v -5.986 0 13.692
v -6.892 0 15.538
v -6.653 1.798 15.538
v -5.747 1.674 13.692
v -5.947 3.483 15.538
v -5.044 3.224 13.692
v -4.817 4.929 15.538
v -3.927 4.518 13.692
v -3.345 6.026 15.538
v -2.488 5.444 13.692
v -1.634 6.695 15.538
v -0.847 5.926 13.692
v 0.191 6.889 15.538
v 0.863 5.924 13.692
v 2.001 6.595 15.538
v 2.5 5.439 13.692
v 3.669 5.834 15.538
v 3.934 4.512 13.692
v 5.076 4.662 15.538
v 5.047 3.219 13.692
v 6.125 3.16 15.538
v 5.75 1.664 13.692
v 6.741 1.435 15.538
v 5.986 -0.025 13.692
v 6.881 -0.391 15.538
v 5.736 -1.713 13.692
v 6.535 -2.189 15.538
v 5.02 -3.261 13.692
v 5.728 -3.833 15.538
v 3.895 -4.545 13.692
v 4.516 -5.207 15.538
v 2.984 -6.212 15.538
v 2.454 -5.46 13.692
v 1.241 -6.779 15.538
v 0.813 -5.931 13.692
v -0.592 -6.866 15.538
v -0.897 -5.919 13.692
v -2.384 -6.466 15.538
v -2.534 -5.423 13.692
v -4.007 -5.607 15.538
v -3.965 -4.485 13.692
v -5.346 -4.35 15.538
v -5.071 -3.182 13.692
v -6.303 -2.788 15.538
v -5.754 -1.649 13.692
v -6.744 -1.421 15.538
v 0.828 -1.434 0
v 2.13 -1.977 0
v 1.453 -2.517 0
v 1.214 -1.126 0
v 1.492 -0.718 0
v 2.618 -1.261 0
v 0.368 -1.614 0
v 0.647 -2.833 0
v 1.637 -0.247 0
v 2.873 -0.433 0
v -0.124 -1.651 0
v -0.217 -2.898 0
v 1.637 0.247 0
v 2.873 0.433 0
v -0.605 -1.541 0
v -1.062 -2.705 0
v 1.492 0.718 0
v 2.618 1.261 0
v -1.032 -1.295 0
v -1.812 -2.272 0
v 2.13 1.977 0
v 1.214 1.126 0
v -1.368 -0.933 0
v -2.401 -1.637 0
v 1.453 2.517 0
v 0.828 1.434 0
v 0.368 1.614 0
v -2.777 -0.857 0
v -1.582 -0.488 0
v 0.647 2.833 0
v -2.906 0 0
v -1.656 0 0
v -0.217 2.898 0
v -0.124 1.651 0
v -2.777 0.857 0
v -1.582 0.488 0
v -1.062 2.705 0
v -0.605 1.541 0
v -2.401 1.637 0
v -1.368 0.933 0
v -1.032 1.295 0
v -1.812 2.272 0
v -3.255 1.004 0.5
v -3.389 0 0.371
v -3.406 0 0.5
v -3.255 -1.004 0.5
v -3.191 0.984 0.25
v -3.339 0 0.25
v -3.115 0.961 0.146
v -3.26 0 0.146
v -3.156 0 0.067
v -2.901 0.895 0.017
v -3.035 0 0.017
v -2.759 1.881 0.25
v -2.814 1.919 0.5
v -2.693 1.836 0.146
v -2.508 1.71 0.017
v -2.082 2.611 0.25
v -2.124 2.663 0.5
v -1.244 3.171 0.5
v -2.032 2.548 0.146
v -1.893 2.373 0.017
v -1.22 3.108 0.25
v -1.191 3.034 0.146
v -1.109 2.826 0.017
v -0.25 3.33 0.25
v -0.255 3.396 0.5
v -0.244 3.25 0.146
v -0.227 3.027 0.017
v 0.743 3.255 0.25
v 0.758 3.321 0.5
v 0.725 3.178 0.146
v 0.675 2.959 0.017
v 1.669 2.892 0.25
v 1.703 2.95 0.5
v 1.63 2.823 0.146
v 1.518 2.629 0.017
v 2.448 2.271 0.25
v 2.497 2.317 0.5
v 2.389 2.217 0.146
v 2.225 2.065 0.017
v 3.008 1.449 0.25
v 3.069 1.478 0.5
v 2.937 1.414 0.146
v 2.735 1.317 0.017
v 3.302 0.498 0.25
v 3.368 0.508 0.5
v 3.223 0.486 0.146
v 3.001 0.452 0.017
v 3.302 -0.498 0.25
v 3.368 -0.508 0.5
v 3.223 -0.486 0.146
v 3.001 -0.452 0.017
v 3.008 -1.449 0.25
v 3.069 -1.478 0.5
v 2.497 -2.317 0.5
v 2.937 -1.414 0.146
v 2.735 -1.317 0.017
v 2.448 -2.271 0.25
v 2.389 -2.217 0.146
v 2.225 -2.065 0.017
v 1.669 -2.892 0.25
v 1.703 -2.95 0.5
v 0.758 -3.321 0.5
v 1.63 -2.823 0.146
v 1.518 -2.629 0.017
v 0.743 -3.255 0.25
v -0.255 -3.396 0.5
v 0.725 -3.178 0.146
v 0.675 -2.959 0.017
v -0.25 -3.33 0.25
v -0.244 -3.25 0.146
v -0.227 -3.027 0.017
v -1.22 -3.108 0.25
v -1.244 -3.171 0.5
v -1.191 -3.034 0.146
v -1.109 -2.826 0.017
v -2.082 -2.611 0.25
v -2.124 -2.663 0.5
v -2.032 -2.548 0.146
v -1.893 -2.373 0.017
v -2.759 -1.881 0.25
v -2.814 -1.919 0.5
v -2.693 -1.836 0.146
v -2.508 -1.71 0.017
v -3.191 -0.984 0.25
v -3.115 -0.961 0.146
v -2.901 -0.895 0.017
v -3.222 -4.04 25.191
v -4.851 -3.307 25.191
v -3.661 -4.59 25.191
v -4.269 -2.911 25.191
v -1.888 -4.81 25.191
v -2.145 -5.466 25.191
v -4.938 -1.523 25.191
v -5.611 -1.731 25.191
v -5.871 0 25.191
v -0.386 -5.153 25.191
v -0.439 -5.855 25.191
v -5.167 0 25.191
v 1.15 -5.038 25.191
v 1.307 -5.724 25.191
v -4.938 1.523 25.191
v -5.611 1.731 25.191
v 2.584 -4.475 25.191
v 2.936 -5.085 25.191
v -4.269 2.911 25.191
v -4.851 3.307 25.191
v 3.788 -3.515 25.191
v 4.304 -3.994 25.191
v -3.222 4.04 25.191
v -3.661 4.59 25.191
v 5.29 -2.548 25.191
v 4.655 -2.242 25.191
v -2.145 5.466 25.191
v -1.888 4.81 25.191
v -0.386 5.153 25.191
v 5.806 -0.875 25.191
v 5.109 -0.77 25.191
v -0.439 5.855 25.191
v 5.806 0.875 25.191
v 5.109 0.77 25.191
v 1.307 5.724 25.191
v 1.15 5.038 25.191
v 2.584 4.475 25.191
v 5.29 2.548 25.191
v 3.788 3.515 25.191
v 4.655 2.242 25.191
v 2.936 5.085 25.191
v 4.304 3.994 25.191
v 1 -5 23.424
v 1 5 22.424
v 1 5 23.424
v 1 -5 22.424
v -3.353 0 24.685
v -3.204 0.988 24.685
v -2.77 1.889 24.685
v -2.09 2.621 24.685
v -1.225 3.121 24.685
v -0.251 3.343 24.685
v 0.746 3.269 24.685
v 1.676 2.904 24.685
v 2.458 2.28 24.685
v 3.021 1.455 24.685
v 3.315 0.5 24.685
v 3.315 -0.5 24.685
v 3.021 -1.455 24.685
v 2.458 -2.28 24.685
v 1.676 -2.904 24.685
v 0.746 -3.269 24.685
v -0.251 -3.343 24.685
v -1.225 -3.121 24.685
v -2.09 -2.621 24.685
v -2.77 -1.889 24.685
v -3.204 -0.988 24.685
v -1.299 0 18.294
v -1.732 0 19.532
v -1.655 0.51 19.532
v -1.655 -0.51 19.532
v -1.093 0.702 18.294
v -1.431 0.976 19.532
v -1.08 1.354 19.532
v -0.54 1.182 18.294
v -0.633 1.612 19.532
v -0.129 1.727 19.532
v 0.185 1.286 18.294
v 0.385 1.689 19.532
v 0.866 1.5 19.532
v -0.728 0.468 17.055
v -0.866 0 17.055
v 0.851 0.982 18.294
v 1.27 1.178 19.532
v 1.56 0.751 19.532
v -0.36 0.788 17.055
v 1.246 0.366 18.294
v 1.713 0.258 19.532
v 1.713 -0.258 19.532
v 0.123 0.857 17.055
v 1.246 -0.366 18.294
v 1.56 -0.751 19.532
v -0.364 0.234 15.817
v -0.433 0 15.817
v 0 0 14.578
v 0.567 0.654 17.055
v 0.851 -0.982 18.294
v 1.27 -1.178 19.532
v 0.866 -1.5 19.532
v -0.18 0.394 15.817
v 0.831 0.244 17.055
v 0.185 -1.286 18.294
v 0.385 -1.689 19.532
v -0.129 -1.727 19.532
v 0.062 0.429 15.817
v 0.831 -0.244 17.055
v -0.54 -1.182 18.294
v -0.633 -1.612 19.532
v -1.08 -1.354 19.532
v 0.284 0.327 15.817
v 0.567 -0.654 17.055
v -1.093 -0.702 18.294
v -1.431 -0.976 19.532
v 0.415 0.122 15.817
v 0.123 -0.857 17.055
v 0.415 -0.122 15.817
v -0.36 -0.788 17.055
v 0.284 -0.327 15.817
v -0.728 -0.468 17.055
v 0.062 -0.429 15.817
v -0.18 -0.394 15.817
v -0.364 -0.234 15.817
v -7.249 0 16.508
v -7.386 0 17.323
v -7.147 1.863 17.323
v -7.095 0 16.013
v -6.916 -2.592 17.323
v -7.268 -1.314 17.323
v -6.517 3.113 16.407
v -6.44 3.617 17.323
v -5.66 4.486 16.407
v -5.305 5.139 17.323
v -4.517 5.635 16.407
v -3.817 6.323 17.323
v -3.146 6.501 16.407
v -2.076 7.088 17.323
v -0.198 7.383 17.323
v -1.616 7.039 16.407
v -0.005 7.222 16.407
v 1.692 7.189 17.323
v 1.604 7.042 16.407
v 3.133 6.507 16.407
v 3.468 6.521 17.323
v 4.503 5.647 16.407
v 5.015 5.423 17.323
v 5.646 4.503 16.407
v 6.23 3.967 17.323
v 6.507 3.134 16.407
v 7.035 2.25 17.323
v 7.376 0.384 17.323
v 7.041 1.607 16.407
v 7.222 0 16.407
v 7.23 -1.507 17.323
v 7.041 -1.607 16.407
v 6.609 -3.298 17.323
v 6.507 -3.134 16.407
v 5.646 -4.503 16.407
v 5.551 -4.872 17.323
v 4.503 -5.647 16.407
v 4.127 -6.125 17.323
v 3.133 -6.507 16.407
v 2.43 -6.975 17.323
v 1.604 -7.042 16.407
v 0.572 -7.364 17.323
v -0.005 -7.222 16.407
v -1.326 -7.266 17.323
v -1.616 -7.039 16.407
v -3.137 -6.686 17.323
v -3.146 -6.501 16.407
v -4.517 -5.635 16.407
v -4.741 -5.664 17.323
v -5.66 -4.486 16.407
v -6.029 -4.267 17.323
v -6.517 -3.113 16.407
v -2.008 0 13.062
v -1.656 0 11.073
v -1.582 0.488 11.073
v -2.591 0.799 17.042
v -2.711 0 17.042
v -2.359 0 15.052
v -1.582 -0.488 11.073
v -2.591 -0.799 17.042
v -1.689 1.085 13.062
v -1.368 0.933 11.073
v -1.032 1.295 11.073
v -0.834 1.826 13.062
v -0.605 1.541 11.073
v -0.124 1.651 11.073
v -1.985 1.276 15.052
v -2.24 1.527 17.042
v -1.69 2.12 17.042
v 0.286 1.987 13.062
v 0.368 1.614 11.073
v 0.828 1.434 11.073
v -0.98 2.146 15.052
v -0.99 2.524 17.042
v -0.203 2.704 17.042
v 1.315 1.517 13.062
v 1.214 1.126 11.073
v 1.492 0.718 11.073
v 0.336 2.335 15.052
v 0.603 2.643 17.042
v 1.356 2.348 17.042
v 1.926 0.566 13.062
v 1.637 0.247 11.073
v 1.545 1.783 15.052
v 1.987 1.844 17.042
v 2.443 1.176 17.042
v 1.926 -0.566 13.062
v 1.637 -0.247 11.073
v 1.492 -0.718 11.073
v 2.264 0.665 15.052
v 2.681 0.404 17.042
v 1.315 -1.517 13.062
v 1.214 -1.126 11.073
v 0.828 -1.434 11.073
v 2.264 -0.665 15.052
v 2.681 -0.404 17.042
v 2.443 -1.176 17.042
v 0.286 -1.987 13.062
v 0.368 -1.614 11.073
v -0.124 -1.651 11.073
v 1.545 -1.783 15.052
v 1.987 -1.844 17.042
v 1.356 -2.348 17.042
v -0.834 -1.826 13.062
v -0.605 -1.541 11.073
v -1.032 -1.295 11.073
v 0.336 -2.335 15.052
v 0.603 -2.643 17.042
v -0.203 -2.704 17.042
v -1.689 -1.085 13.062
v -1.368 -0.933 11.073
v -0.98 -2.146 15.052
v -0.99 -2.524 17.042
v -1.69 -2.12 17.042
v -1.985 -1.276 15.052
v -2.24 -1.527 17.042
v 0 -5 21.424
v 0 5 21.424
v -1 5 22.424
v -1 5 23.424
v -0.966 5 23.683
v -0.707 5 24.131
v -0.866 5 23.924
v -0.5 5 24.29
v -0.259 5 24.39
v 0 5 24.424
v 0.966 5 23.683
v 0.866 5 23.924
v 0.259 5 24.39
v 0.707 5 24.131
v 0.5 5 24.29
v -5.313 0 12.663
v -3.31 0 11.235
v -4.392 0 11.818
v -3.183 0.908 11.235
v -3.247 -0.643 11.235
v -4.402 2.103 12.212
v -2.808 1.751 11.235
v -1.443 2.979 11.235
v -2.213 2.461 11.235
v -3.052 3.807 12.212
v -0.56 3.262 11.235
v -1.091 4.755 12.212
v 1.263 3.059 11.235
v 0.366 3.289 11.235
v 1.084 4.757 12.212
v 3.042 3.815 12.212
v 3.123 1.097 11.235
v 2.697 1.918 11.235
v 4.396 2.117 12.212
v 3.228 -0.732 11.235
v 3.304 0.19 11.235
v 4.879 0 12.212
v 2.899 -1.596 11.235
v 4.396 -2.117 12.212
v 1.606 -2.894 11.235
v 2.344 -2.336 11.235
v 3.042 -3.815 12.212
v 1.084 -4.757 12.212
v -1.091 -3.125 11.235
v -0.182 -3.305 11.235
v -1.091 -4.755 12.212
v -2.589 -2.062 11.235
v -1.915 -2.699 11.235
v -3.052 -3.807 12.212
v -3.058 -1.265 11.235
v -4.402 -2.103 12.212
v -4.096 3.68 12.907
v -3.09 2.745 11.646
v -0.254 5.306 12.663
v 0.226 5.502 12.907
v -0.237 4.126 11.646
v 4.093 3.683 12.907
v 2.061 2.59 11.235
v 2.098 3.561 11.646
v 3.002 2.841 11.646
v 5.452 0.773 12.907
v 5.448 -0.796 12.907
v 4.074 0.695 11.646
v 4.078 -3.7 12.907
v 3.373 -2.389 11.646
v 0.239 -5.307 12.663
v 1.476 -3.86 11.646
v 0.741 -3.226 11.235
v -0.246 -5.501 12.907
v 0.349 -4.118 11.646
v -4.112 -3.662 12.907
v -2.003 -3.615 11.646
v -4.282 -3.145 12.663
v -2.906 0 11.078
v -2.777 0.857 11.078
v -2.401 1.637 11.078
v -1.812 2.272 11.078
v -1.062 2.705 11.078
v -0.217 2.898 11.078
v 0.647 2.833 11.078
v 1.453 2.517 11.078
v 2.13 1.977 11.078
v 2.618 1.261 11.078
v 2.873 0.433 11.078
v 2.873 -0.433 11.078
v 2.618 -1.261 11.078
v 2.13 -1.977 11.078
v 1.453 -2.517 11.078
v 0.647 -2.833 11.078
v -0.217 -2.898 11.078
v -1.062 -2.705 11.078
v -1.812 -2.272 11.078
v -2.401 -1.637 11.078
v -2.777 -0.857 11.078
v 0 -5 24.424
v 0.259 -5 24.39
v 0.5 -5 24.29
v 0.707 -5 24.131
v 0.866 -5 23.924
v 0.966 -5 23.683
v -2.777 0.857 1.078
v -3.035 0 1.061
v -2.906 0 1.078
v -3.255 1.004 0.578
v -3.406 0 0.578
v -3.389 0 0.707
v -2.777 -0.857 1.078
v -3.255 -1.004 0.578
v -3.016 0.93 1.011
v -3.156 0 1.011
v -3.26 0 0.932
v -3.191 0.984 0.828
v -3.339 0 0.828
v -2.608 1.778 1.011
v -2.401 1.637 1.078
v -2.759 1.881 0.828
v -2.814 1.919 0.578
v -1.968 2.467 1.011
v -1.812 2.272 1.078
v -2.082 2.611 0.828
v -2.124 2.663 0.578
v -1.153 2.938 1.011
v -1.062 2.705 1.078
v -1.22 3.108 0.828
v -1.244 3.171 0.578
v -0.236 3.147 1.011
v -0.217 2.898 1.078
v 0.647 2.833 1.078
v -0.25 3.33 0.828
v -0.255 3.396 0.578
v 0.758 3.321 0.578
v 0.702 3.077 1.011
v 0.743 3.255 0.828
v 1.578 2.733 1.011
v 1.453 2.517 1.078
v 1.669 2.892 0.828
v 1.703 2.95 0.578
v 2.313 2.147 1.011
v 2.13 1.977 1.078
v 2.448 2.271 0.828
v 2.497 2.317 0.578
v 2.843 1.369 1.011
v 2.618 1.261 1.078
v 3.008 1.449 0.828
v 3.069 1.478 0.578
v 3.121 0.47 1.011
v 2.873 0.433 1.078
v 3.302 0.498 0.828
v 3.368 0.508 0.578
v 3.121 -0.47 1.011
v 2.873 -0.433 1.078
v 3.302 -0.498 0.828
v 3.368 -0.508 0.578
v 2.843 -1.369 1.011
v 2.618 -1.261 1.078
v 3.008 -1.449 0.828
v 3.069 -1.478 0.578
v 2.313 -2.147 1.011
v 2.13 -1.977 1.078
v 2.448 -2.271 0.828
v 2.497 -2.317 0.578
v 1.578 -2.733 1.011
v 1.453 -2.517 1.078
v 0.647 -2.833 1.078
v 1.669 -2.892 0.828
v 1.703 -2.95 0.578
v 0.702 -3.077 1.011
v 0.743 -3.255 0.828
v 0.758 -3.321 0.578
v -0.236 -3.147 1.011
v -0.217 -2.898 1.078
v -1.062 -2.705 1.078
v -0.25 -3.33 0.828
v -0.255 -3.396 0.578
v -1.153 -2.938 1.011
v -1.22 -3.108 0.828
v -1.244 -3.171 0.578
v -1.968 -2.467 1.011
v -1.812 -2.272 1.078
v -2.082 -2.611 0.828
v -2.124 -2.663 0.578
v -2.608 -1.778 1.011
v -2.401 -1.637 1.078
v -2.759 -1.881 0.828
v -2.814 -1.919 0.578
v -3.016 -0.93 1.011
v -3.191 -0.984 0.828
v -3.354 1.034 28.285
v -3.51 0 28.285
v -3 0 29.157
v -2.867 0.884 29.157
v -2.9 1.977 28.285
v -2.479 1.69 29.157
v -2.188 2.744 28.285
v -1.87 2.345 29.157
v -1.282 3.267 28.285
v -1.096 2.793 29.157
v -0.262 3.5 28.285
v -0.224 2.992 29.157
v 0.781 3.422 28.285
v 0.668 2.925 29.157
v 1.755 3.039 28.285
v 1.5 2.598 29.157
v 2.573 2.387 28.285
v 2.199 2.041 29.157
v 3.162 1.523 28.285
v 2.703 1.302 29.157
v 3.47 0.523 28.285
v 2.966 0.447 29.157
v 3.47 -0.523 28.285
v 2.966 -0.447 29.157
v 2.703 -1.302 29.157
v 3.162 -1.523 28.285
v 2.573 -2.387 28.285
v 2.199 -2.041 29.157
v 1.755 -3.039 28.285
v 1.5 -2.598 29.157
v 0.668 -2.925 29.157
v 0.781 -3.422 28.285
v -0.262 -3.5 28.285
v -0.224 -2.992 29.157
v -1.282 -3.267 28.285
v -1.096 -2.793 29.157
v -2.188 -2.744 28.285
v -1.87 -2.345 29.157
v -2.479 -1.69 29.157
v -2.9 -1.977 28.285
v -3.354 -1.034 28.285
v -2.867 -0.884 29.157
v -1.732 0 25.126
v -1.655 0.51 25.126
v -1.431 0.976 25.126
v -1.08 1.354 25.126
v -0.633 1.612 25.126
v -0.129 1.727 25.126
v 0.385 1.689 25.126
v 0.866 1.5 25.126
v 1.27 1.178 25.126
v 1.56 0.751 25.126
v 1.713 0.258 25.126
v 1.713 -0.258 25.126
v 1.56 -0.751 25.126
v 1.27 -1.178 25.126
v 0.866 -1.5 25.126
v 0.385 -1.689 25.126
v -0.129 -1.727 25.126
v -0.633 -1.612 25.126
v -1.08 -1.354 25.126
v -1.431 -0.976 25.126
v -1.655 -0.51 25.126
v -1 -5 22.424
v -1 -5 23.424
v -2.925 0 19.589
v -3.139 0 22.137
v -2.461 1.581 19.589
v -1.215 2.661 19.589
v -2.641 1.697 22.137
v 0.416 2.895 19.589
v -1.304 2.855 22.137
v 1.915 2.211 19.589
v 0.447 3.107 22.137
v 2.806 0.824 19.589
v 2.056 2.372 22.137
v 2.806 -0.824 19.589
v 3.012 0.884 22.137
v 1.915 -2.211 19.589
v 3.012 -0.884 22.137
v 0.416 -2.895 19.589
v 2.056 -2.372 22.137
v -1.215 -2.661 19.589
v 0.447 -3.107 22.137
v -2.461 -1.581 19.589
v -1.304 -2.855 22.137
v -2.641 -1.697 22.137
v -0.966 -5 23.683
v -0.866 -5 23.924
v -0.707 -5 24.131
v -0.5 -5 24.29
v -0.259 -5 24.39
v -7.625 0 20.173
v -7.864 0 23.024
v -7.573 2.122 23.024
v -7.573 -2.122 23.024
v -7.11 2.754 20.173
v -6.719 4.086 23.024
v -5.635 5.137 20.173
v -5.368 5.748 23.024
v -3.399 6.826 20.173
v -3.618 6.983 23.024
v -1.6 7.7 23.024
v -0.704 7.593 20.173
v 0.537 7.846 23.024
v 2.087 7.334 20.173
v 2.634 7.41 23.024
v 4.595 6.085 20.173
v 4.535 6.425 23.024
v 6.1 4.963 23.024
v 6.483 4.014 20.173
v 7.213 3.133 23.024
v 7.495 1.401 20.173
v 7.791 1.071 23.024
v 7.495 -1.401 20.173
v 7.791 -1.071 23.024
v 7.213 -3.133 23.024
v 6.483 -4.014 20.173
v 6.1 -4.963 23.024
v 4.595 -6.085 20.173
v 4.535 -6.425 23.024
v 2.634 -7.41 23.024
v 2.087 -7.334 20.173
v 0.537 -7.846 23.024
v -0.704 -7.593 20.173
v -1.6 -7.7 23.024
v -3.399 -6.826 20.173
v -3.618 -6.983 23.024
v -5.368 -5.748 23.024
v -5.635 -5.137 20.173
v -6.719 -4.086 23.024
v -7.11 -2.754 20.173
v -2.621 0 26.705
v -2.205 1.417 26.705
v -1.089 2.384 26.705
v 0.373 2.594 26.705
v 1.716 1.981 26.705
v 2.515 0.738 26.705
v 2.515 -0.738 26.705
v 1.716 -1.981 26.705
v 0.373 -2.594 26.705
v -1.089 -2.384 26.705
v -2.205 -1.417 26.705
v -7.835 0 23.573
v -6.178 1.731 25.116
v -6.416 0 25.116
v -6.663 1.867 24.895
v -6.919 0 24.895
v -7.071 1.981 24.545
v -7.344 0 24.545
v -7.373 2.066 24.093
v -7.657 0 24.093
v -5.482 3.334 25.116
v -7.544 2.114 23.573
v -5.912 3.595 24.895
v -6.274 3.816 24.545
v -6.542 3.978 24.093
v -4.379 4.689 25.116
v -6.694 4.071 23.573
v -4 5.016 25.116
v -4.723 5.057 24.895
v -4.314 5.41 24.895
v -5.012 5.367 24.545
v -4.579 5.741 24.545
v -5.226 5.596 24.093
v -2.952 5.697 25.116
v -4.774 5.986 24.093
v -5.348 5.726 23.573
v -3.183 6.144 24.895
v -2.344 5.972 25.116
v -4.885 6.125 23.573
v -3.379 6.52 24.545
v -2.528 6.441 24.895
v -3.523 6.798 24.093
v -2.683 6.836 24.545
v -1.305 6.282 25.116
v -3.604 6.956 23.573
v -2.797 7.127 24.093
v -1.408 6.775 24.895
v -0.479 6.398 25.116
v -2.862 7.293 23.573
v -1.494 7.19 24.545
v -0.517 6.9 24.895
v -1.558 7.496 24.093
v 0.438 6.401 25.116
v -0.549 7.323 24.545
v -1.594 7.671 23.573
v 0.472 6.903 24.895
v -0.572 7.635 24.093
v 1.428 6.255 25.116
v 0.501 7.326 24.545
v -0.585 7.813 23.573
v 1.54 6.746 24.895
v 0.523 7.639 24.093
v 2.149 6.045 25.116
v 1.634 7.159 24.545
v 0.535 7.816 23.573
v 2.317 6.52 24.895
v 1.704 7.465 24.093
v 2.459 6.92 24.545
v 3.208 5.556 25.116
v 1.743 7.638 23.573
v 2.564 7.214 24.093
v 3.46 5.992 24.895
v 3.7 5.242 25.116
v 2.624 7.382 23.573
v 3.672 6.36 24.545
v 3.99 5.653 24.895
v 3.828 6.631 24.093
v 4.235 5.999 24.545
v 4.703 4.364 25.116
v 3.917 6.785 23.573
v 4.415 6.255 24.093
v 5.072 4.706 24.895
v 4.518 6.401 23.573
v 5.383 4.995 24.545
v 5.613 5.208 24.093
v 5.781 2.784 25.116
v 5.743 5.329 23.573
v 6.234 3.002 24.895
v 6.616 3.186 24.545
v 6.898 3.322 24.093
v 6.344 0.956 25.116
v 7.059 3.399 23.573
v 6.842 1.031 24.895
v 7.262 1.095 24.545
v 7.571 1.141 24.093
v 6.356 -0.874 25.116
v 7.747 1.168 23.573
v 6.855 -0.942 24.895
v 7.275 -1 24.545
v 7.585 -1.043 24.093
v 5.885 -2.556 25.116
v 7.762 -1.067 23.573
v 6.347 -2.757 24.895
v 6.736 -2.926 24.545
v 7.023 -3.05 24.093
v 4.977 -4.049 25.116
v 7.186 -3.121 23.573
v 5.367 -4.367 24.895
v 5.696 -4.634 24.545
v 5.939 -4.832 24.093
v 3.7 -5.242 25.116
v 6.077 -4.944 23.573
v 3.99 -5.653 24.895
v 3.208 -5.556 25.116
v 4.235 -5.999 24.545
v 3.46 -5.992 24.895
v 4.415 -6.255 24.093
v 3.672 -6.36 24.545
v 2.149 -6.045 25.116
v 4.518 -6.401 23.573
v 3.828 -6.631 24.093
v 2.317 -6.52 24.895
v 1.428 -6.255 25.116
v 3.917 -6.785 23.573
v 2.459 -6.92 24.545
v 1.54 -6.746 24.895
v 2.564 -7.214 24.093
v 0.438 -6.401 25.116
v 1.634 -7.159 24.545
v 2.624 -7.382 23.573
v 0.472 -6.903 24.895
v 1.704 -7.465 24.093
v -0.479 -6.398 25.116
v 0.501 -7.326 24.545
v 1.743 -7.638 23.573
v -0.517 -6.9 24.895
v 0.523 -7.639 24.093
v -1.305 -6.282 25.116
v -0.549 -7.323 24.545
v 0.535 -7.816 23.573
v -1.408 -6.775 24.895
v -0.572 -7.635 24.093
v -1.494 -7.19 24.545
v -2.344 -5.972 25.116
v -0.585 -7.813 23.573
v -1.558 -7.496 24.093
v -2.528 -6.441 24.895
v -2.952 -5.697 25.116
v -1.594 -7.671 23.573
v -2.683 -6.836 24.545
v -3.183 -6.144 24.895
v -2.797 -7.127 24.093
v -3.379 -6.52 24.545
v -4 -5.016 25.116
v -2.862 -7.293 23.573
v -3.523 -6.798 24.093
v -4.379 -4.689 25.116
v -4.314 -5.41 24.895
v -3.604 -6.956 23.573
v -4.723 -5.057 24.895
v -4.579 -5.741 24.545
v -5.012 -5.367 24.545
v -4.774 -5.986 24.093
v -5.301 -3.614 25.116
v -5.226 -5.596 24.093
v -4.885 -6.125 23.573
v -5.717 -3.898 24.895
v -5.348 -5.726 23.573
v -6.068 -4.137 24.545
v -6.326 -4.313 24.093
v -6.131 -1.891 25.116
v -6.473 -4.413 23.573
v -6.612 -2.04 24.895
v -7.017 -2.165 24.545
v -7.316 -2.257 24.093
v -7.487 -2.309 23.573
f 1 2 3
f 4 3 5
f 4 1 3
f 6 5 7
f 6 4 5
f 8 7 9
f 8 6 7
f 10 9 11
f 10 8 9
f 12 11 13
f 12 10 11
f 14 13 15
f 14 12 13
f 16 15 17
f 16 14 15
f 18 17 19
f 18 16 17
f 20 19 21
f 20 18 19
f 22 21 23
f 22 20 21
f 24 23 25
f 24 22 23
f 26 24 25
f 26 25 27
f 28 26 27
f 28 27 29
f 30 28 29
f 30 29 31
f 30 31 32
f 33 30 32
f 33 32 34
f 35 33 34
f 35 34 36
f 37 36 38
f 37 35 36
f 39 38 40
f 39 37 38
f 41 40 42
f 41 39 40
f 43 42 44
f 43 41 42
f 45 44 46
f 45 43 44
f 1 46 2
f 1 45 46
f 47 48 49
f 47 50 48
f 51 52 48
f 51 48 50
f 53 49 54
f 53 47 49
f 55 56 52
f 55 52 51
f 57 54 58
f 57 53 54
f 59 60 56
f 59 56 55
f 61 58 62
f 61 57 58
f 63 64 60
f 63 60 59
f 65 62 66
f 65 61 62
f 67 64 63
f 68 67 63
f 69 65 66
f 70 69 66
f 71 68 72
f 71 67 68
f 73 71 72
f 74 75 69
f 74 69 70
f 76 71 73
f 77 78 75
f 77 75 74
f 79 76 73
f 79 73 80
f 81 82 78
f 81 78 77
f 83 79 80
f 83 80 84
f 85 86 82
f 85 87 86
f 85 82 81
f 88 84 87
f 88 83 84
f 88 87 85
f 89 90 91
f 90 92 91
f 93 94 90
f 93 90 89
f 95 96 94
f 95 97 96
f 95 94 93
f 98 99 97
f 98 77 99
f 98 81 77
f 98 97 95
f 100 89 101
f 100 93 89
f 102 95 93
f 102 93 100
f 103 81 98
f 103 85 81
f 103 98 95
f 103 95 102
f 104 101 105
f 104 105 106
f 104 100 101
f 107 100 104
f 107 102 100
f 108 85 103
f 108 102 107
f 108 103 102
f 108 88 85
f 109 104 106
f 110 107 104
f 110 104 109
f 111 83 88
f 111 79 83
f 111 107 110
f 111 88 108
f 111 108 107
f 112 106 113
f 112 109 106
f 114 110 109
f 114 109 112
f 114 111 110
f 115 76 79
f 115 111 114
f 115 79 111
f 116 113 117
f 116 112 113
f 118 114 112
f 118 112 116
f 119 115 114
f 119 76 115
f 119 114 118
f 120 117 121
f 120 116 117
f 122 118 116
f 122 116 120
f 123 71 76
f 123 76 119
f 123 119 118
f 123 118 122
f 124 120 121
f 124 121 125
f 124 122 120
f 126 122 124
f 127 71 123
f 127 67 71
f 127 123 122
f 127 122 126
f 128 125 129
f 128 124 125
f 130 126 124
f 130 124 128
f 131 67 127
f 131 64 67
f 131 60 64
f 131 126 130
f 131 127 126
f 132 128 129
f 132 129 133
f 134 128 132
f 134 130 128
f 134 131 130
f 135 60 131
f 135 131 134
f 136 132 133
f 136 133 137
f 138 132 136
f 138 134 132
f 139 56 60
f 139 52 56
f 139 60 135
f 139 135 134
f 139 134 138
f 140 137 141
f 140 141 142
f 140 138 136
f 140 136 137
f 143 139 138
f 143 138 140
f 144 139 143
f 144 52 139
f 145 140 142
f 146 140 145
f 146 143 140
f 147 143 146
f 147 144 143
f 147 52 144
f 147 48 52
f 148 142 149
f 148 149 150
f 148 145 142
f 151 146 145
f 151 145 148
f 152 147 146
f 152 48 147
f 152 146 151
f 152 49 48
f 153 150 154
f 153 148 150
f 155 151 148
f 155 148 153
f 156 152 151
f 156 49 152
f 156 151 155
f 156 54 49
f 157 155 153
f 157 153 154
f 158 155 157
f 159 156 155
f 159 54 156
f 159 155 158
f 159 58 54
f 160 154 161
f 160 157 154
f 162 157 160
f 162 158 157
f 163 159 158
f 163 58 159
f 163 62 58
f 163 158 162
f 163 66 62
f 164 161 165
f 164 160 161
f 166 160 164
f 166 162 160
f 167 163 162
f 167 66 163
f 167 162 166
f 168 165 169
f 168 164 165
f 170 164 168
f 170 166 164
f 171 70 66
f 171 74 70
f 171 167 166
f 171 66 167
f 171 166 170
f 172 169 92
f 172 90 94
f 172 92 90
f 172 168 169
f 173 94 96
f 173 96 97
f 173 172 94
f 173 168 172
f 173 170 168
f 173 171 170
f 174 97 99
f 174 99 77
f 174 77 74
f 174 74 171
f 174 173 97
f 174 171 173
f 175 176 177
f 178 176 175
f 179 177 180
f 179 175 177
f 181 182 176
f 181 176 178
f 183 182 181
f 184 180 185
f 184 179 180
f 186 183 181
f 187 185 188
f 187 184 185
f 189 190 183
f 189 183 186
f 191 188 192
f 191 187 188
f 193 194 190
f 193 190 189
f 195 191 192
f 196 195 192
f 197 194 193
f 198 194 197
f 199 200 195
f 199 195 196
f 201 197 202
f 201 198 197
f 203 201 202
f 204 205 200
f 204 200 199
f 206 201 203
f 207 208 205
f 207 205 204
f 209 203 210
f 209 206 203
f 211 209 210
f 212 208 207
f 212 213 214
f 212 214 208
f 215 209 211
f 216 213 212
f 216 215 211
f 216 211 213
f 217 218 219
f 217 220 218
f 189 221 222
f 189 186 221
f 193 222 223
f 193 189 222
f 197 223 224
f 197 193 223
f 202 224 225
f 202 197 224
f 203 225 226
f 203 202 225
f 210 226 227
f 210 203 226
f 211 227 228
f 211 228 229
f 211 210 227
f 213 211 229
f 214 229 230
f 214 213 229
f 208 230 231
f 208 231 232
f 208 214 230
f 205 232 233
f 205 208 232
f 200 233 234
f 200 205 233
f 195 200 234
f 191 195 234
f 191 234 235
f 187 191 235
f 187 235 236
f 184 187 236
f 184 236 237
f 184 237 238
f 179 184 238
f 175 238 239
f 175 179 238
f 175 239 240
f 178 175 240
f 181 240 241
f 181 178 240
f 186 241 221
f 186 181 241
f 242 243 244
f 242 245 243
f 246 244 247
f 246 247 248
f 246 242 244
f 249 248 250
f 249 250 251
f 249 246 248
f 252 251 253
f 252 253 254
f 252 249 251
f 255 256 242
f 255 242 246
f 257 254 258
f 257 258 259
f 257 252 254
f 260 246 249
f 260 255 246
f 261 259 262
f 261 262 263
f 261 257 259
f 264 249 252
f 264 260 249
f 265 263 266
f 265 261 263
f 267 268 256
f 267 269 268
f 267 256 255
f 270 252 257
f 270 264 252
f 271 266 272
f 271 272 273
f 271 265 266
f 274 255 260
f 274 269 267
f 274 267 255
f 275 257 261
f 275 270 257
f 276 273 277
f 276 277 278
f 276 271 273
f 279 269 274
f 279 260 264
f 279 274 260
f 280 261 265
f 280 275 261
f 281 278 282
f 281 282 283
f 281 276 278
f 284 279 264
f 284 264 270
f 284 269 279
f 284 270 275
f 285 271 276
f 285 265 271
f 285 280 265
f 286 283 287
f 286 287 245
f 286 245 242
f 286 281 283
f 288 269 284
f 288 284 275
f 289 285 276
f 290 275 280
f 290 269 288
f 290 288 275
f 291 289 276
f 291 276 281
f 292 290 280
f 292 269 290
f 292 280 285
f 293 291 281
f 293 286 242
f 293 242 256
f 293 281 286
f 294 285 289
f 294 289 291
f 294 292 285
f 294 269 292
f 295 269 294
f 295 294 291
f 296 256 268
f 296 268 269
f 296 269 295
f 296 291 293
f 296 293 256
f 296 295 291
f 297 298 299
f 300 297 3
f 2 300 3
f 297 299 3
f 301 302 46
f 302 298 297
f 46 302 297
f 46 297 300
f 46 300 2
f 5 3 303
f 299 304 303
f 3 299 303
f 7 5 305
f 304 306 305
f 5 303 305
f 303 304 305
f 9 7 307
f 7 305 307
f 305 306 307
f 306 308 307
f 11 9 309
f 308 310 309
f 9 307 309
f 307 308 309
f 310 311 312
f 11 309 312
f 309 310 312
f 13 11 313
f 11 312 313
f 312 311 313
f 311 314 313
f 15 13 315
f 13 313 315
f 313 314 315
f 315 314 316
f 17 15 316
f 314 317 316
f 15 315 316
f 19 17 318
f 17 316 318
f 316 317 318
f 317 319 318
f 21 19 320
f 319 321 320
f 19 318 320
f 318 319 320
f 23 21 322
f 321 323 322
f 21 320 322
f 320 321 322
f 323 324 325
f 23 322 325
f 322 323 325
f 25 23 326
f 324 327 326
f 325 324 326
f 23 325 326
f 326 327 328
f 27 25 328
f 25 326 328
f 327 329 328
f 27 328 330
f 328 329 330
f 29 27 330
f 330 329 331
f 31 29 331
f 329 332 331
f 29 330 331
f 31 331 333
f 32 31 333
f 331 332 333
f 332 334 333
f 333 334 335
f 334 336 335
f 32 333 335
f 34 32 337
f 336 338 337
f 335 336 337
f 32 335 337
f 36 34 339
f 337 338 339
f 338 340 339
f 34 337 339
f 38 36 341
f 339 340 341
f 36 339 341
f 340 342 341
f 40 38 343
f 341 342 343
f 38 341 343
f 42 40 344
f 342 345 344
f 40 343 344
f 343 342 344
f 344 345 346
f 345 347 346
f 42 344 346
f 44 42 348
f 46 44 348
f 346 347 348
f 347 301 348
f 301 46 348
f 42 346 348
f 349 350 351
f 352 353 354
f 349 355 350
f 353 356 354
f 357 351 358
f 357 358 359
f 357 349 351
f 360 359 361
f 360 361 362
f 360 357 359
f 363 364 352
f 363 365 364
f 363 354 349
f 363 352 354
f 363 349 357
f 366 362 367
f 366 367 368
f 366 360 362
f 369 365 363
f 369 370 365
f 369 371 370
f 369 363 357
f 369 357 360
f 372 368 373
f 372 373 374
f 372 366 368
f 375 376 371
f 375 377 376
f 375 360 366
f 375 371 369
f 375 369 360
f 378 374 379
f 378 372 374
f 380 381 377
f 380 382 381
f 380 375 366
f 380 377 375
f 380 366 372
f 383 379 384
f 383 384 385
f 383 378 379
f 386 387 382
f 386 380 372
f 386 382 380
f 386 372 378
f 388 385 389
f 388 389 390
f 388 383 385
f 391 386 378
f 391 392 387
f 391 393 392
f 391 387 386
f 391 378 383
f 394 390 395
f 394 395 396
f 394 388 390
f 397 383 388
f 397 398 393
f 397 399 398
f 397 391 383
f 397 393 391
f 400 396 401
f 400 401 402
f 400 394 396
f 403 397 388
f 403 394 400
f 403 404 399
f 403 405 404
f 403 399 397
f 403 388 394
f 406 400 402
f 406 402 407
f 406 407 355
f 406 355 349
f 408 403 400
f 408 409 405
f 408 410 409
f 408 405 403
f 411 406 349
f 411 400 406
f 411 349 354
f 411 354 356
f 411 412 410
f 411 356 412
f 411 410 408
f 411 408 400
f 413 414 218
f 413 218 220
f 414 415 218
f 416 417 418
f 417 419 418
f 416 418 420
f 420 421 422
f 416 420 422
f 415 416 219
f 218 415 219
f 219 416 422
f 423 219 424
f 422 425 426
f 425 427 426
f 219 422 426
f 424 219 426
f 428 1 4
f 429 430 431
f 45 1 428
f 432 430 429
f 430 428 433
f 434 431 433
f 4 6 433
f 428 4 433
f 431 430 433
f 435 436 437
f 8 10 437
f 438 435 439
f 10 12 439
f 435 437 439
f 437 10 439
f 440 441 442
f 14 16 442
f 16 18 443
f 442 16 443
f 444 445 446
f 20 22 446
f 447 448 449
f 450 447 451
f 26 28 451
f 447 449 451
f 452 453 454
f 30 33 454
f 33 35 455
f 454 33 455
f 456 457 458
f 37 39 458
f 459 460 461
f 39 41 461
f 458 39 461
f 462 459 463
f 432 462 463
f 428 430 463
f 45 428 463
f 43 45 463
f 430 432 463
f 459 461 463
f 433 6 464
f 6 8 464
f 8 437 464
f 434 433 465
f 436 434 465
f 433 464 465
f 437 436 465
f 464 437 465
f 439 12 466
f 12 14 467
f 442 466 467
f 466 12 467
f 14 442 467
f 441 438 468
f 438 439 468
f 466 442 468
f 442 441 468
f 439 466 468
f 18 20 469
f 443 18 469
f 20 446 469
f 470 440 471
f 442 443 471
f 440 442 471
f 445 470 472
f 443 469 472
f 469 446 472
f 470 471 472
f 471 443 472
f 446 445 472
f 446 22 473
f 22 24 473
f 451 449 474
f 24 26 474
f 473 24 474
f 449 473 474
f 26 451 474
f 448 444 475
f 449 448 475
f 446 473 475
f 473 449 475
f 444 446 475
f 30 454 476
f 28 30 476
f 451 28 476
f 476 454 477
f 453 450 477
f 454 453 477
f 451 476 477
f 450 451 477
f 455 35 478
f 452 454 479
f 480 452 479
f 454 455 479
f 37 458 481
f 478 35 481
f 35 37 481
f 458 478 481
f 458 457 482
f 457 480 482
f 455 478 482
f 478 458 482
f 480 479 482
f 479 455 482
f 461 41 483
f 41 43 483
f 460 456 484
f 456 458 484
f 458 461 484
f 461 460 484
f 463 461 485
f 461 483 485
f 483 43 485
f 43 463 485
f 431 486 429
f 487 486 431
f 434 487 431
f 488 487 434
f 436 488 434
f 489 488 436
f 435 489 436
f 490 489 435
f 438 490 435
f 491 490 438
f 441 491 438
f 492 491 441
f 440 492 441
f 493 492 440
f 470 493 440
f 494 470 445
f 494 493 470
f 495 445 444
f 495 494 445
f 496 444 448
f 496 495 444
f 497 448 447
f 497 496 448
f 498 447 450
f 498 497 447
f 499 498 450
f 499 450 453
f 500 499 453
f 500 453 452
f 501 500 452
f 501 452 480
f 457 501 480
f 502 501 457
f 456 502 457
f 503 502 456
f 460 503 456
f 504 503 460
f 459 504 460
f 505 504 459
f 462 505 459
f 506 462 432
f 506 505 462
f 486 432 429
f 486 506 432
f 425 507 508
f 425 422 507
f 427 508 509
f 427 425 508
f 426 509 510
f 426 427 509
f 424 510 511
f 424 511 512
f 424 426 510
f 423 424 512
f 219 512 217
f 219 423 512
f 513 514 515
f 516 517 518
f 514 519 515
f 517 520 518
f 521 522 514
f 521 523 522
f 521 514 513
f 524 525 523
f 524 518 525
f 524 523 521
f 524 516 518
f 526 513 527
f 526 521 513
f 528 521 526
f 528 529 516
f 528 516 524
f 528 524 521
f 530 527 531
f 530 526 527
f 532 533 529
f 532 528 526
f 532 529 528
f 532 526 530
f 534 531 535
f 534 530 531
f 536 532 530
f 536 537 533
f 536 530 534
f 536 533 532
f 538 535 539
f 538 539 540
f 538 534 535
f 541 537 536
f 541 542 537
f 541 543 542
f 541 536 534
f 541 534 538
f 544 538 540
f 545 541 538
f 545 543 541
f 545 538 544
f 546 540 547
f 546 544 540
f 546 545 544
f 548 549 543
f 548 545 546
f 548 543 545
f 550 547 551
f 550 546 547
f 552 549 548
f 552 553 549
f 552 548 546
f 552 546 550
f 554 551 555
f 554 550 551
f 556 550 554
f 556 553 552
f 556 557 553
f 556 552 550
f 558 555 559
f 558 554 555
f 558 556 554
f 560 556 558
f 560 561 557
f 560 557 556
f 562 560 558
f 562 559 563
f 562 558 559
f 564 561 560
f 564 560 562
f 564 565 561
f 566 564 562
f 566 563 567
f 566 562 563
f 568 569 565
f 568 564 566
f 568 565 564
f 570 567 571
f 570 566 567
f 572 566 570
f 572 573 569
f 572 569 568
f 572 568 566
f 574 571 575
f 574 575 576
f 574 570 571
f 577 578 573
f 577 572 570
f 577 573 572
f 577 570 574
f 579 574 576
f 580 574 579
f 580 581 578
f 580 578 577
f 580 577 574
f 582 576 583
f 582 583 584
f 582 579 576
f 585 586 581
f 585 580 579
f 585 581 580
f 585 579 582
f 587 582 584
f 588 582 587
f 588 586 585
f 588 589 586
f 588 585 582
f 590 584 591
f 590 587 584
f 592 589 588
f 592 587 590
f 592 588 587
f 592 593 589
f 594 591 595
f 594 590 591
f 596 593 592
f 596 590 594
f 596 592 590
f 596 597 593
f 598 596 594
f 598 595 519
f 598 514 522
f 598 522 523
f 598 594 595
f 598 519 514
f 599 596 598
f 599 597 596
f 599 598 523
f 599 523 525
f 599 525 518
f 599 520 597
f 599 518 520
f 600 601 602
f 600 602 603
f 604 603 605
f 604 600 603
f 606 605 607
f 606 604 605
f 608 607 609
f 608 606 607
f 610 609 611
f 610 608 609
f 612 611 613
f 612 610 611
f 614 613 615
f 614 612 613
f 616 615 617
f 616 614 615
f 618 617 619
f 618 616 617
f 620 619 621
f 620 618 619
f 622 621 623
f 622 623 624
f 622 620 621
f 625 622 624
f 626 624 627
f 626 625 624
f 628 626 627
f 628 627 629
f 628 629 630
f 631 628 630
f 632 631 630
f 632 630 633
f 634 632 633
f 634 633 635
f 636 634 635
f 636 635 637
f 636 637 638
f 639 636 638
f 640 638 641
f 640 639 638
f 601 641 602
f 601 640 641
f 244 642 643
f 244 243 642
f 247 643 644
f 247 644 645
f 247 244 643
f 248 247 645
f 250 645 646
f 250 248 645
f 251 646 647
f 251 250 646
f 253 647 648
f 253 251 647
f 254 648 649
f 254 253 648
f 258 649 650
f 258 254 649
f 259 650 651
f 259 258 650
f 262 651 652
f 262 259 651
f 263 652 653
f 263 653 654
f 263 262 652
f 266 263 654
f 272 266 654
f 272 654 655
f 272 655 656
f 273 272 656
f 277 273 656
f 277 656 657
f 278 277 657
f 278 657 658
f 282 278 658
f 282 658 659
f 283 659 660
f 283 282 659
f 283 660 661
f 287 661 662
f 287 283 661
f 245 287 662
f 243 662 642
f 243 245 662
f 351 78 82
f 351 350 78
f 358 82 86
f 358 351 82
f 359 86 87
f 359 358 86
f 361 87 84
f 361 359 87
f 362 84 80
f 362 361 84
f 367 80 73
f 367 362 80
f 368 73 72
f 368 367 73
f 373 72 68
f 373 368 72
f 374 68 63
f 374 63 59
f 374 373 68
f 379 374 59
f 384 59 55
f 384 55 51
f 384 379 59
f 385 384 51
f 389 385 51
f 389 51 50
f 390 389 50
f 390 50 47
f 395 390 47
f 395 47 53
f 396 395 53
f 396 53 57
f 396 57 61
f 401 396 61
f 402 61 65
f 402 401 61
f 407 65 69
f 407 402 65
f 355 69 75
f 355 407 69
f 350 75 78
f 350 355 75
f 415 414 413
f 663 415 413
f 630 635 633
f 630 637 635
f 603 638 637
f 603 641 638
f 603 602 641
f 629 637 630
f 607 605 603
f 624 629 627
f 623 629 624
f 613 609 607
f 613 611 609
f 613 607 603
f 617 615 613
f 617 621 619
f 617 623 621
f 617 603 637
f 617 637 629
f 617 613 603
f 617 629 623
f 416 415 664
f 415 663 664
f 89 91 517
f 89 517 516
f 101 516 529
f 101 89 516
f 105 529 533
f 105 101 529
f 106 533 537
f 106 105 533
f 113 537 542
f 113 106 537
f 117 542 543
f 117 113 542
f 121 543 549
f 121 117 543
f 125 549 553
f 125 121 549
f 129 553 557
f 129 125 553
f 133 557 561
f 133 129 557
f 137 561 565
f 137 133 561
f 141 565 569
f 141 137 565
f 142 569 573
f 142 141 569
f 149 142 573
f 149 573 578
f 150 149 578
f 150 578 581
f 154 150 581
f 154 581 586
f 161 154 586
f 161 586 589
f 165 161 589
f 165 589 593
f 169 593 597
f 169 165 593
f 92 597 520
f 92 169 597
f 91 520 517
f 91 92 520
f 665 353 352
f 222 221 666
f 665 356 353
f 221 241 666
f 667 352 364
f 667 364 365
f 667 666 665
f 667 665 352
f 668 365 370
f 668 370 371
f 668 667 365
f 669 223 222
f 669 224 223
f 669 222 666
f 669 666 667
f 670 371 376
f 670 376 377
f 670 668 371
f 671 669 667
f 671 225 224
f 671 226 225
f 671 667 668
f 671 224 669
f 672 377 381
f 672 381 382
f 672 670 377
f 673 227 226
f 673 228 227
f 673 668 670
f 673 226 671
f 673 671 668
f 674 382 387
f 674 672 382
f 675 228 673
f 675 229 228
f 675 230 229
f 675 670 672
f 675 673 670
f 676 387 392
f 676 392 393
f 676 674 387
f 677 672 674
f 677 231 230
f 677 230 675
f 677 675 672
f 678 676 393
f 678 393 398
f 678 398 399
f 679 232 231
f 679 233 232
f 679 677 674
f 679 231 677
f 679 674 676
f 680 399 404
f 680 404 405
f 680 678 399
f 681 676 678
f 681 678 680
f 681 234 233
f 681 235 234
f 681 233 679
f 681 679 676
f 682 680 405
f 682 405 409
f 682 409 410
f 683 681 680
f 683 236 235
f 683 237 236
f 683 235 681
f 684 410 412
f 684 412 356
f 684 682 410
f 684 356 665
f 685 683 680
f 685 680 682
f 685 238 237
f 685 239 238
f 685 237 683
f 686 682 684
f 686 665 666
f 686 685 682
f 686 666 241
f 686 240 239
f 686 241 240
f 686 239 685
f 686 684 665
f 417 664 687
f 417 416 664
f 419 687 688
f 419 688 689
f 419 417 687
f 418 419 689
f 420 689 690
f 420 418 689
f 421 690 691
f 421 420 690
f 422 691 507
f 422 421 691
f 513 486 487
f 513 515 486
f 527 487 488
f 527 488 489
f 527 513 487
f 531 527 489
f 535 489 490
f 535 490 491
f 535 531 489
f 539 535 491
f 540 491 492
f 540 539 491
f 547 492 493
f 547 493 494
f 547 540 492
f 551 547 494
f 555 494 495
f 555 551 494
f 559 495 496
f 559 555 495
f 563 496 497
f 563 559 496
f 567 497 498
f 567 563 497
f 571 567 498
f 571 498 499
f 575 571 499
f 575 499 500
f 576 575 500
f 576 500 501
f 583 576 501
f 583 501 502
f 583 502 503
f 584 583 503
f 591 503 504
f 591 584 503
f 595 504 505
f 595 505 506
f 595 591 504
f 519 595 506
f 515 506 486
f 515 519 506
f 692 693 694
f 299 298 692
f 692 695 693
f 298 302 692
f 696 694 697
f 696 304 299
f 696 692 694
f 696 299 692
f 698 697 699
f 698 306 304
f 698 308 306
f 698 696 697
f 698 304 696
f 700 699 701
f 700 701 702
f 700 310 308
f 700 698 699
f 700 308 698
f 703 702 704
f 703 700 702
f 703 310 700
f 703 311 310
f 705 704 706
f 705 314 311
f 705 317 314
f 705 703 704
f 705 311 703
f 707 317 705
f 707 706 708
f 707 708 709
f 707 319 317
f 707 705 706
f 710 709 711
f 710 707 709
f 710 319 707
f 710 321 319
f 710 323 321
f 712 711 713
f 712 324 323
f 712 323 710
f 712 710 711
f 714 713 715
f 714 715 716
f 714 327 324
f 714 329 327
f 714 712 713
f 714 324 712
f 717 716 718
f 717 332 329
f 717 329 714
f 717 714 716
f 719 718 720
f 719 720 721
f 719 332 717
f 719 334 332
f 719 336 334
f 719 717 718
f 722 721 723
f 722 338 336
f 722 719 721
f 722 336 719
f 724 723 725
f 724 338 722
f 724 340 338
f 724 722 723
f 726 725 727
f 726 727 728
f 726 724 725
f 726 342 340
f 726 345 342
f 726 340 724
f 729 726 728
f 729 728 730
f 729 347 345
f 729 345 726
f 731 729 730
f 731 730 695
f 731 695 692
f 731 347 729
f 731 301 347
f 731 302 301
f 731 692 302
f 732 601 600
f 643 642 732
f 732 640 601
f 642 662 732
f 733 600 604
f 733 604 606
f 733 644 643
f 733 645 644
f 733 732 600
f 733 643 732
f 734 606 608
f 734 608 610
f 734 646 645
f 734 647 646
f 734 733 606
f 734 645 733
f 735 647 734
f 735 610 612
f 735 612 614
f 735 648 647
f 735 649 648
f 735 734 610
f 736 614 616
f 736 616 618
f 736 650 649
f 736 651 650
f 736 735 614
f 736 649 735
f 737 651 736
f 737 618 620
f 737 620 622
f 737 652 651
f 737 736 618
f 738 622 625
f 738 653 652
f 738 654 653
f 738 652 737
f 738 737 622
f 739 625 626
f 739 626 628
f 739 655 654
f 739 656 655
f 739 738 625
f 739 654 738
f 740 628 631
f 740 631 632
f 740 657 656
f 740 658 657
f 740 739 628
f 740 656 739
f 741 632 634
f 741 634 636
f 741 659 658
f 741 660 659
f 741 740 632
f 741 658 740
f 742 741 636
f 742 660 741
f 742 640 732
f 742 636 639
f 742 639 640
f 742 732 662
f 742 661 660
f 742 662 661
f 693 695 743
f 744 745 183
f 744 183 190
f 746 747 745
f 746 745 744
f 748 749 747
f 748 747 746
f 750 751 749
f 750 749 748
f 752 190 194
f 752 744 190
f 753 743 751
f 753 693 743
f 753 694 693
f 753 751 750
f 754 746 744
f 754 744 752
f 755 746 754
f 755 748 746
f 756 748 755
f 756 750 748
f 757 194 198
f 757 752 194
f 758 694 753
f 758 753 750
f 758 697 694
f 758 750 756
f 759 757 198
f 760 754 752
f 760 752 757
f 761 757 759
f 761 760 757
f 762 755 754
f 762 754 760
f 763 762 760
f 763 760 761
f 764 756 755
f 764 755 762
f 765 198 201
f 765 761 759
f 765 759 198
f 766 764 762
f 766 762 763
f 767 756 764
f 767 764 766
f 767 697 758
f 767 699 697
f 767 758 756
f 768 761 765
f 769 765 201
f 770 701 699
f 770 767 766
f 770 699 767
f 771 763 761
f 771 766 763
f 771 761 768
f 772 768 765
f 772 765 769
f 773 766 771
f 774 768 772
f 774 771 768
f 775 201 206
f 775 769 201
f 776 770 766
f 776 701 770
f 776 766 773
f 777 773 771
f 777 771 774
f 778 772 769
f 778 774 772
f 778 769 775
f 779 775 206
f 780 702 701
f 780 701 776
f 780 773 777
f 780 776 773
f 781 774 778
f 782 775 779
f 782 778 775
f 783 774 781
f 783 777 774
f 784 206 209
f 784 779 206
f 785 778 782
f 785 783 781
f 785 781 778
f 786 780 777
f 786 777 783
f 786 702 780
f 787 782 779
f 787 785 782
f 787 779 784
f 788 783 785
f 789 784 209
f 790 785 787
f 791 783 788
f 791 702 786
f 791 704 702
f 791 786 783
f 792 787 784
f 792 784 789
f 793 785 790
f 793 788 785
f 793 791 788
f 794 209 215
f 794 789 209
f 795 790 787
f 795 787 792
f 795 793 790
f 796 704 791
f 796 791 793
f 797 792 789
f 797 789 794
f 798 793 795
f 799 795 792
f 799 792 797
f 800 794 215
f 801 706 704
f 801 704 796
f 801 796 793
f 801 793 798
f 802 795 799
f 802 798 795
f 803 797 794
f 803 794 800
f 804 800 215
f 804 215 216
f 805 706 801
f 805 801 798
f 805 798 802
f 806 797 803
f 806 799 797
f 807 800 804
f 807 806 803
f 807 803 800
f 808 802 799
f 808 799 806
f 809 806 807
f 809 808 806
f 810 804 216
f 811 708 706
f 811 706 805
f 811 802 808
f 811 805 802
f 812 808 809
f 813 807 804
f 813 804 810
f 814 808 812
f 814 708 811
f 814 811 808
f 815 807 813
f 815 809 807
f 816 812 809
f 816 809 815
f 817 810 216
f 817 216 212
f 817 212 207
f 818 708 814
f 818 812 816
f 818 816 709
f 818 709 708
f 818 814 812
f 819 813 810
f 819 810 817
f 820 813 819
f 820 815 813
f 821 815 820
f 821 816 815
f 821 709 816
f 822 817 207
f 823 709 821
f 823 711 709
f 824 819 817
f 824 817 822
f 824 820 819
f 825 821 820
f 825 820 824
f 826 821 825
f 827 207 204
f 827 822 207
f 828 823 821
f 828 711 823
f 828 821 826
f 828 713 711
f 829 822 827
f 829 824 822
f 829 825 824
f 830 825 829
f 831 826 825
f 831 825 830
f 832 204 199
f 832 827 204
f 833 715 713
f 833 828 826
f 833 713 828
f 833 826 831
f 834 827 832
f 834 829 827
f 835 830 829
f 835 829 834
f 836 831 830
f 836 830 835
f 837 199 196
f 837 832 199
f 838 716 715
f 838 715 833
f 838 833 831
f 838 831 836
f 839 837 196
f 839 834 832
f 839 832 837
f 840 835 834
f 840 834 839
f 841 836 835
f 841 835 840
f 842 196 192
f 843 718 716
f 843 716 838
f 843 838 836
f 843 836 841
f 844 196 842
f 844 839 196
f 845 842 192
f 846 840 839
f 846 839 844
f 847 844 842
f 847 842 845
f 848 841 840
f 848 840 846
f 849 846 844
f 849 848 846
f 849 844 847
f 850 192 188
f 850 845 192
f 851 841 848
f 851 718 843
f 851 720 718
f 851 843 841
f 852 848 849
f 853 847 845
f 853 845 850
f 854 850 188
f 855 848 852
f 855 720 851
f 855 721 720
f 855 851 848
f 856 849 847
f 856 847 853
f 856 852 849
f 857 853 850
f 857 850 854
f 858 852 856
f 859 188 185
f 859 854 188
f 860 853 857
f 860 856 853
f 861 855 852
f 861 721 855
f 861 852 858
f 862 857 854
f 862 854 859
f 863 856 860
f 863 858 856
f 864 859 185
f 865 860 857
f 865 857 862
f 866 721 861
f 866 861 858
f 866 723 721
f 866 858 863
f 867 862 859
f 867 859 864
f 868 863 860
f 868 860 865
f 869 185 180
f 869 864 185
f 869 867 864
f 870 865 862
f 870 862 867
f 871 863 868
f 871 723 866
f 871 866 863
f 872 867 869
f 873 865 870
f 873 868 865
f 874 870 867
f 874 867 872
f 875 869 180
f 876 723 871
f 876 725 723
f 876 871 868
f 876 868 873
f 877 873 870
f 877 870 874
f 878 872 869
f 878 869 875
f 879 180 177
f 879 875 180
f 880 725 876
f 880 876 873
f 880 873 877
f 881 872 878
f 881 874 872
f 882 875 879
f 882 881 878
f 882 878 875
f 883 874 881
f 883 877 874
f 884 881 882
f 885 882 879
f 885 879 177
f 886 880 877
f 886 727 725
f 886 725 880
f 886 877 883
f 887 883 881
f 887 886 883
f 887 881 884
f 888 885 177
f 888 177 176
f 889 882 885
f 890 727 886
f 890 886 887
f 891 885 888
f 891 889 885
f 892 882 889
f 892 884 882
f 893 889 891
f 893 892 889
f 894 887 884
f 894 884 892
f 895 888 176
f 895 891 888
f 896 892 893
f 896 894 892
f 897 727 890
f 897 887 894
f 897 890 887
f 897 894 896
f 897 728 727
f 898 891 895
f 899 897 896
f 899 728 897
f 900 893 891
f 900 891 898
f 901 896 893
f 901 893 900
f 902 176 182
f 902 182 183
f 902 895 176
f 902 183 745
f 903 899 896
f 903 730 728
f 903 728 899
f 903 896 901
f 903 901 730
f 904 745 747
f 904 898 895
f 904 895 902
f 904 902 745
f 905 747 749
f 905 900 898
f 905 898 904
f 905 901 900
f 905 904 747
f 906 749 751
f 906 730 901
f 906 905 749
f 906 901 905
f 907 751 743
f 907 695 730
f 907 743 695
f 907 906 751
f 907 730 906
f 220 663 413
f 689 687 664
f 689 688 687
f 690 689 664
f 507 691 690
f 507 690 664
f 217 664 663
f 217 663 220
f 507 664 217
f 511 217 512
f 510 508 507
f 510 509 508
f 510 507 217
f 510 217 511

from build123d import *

# Parameters (mm, degrees)
F2_W     = 2
F2_H     = 3
F3_DEPTH = 5
F4_SIZE  = 0.99999
F5_R     = 0.99999
F6_R     = 2
F7_SIZE  = 1
F8_R     = 5
F9_R     = 0.49999


# Not quite as in the source:
# - a fillet or chamfer is up to 0.001 mm smaller than in the source, because OpenCascade refuses the exact size


with BuildPart() as f1:
    # F0 (on Front) → F1 (revolve)
    with BuildSketch(Plane.XZ):
        Polygon((0, 14.5783070475), (0, 29.156614095), (-4, 29.156614095), (-1.7319330946, 25.1257959753), (-1.7319330946, 22.7402094752), (-1.7319330946, 19.5320062339), align=None)
    revolve(axis=Axis((0, 0, 14.5783070475), (0, 0, -1)))

    # F7
    f7_edges = [f1.edges().sort_by_distance(p)[0] for p in [
        (4, 0, 29.156614),
    ]]
    chamfer(f7_edges, length=F7_SIZE)


with BuildPart() as f1b:
    # F0 (on Front) → F1, piece 2 (revolve)
    with BuildSketch(Plane.XZ):
        Polygon((-3.3527006079, 24.6845433628), (-5.1671702769, 25.1912331348), (-8.0463260766, 25.1912331348), (-7.306943031, 16.3838422066), (-5.1270102505, 11.9417147851), (-2.9059470054, 11.0779680451), (-2.9059470054, 1.0779680451), (-3.4059470054, 1.0779680451), (-3.4059470054, 0), (-3, 0), (-1.6558364648, 0), (-1.6558364648, 11.0725850007), (-2.7111049439, 17.0419772207), align=None)
    revolve(axis=Axis((0, 0, 14.5783070475), (0, 0, -1)))

    # F6
    f6_edges = [f1b.edges().sort_by_distance(p)[0] for p in [
        (8.046326, 0, 25.191233),
    ]]
    fillet(f6_edges, radius=F6_R)

    # F8
    f8_edges = [f1b.edges().sort_by_distance(p)[0] for p in [
        (7.306943, 0, 16.383842),
        (5.12701, 0, 11.941715),
    ]]
    fillet(f8_edges, radius=F8_R)

    # F9 (radius 0.5 in the source; OpenCascade refuses exactly that, so slightly less here)
    f9_edges = [f1b.edges().sort_by_distance(p)[0] for p in [
        (3.405947, 0, 0),
        (3.405947, 0, 1.077968),
    ]]
    fillet(f9_edges, radius=F9_R)


with BuildPart() as f3:
    # F2 (on Front) → F3 (new body, symmetric)
    with BuildSketch(Plane.XZ):
        with Locations((0, 22.9238849133)):
            Rectangle(F2_W, F2_H)
    extrude(amount=F3_DEPTH, both=True)

    # F4 (size 1 in the source; OpenCascade refuses exactly that, so slightly less here)
    f4_edges = [f3.edges().sort_by_distance(p)[0] for p in [
        (-1, 0, 21.423885),
        (1, 0, 21.423885),
    ]]
    chamfer(f4_edges, length=F4_SIZE)

    # F5 (radius 1 in the source; OpenCascade refuses exactly that, so slightly less here)
    f5_edges = [f3.edges().sort_by_distance(p)[0] for p in [
        (-1, 0, 24.423885),
        (1, 0, 24.423885),
    ]]
    fillet(f5_edges, radius=F5_R)


solid = Compound([f1.part, f1b.part, f3.part])
